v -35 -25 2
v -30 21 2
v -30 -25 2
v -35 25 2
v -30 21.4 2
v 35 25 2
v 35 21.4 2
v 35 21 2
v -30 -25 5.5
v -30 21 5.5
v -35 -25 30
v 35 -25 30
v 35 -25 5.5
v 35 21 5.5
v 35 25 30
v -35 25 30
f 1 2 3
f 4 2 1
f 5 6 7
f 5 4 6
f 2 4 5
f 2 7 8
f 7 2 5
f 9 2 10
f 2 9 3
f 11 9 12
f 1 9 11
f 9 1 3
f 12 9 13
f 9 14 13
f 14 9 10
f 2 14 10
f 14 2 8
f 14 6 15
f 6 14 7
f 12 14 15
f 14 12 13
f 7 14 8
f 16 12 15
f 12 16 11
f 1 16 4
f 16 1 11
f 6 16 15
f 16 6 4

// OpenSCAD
// Two-part enclosure for a small electronics board (e.g. Arduino-based temperature logger)
// Print orientation: both parts rest on the bed (z = 0), side by side, with a 10 mm gap.
// The lid is printed upside down: a flat plate with a rectangular lip that slides into the box.

// ---------------- Parameters ----------------
box_x      = 70;    // outer length of box (X)
box_y      = 50;    // outer width of box (Y)
box_h      = 30;    // outer height of box (Z)

wall       = 2;     // wall thickness (mm)
floor      = 2;     // floor thickness under box bottom (mm)

lip_t      = 1.5;   // lip wall thickness (mm)
lip_h      = 4;     // lip height above plate (mm)
lip_x      = 65.6;  // outer length of lip (X)
lip_y      = 45.6;  // outer width of lip (Y)

clearance  = 0.2;   // clearance between lip outer size and box opening (mm)

eps        = 0.5;   // overcut for clean boolean differences (mm)

gap        = 10;    // horizontal gap between the two parts on the bed (mm)

$fn = 64;

// ---------------- Derived ----------------
box_i_x = box_x - 2 * wall;   // box interior length
box_i_y = box_y - 2 * wall;   // box interior width
lip_w   = lip_h + lip_t;      // total lip thickness (wall + top face)

// ---------------- Model ----------------
difference() {
    // Box: open-top box with a floor under the bottom face
    translate([-box_x / 2, -box_y / 2, floor])
        cube([box_x, box_y, box_h - floor]);

    // Lid: plate lying on the bed, centred, with a rectangular lip on the +X side
    translate([-box_x / 2 + gap / 2, -box_y / 2, 0])
        union() {
            // Base plate, full footprint under the lip
            cube([box_i_x + 2 * clearance, box_i_y + 2 * clearance, 2]);

            // Lip block, extends past the +X and +Y edges of the plate
            translate([0, 0, 0])
                cube([lip_x + 2 * clearance, lip_y + 2 * clearance, lip_w]);
        }
}
